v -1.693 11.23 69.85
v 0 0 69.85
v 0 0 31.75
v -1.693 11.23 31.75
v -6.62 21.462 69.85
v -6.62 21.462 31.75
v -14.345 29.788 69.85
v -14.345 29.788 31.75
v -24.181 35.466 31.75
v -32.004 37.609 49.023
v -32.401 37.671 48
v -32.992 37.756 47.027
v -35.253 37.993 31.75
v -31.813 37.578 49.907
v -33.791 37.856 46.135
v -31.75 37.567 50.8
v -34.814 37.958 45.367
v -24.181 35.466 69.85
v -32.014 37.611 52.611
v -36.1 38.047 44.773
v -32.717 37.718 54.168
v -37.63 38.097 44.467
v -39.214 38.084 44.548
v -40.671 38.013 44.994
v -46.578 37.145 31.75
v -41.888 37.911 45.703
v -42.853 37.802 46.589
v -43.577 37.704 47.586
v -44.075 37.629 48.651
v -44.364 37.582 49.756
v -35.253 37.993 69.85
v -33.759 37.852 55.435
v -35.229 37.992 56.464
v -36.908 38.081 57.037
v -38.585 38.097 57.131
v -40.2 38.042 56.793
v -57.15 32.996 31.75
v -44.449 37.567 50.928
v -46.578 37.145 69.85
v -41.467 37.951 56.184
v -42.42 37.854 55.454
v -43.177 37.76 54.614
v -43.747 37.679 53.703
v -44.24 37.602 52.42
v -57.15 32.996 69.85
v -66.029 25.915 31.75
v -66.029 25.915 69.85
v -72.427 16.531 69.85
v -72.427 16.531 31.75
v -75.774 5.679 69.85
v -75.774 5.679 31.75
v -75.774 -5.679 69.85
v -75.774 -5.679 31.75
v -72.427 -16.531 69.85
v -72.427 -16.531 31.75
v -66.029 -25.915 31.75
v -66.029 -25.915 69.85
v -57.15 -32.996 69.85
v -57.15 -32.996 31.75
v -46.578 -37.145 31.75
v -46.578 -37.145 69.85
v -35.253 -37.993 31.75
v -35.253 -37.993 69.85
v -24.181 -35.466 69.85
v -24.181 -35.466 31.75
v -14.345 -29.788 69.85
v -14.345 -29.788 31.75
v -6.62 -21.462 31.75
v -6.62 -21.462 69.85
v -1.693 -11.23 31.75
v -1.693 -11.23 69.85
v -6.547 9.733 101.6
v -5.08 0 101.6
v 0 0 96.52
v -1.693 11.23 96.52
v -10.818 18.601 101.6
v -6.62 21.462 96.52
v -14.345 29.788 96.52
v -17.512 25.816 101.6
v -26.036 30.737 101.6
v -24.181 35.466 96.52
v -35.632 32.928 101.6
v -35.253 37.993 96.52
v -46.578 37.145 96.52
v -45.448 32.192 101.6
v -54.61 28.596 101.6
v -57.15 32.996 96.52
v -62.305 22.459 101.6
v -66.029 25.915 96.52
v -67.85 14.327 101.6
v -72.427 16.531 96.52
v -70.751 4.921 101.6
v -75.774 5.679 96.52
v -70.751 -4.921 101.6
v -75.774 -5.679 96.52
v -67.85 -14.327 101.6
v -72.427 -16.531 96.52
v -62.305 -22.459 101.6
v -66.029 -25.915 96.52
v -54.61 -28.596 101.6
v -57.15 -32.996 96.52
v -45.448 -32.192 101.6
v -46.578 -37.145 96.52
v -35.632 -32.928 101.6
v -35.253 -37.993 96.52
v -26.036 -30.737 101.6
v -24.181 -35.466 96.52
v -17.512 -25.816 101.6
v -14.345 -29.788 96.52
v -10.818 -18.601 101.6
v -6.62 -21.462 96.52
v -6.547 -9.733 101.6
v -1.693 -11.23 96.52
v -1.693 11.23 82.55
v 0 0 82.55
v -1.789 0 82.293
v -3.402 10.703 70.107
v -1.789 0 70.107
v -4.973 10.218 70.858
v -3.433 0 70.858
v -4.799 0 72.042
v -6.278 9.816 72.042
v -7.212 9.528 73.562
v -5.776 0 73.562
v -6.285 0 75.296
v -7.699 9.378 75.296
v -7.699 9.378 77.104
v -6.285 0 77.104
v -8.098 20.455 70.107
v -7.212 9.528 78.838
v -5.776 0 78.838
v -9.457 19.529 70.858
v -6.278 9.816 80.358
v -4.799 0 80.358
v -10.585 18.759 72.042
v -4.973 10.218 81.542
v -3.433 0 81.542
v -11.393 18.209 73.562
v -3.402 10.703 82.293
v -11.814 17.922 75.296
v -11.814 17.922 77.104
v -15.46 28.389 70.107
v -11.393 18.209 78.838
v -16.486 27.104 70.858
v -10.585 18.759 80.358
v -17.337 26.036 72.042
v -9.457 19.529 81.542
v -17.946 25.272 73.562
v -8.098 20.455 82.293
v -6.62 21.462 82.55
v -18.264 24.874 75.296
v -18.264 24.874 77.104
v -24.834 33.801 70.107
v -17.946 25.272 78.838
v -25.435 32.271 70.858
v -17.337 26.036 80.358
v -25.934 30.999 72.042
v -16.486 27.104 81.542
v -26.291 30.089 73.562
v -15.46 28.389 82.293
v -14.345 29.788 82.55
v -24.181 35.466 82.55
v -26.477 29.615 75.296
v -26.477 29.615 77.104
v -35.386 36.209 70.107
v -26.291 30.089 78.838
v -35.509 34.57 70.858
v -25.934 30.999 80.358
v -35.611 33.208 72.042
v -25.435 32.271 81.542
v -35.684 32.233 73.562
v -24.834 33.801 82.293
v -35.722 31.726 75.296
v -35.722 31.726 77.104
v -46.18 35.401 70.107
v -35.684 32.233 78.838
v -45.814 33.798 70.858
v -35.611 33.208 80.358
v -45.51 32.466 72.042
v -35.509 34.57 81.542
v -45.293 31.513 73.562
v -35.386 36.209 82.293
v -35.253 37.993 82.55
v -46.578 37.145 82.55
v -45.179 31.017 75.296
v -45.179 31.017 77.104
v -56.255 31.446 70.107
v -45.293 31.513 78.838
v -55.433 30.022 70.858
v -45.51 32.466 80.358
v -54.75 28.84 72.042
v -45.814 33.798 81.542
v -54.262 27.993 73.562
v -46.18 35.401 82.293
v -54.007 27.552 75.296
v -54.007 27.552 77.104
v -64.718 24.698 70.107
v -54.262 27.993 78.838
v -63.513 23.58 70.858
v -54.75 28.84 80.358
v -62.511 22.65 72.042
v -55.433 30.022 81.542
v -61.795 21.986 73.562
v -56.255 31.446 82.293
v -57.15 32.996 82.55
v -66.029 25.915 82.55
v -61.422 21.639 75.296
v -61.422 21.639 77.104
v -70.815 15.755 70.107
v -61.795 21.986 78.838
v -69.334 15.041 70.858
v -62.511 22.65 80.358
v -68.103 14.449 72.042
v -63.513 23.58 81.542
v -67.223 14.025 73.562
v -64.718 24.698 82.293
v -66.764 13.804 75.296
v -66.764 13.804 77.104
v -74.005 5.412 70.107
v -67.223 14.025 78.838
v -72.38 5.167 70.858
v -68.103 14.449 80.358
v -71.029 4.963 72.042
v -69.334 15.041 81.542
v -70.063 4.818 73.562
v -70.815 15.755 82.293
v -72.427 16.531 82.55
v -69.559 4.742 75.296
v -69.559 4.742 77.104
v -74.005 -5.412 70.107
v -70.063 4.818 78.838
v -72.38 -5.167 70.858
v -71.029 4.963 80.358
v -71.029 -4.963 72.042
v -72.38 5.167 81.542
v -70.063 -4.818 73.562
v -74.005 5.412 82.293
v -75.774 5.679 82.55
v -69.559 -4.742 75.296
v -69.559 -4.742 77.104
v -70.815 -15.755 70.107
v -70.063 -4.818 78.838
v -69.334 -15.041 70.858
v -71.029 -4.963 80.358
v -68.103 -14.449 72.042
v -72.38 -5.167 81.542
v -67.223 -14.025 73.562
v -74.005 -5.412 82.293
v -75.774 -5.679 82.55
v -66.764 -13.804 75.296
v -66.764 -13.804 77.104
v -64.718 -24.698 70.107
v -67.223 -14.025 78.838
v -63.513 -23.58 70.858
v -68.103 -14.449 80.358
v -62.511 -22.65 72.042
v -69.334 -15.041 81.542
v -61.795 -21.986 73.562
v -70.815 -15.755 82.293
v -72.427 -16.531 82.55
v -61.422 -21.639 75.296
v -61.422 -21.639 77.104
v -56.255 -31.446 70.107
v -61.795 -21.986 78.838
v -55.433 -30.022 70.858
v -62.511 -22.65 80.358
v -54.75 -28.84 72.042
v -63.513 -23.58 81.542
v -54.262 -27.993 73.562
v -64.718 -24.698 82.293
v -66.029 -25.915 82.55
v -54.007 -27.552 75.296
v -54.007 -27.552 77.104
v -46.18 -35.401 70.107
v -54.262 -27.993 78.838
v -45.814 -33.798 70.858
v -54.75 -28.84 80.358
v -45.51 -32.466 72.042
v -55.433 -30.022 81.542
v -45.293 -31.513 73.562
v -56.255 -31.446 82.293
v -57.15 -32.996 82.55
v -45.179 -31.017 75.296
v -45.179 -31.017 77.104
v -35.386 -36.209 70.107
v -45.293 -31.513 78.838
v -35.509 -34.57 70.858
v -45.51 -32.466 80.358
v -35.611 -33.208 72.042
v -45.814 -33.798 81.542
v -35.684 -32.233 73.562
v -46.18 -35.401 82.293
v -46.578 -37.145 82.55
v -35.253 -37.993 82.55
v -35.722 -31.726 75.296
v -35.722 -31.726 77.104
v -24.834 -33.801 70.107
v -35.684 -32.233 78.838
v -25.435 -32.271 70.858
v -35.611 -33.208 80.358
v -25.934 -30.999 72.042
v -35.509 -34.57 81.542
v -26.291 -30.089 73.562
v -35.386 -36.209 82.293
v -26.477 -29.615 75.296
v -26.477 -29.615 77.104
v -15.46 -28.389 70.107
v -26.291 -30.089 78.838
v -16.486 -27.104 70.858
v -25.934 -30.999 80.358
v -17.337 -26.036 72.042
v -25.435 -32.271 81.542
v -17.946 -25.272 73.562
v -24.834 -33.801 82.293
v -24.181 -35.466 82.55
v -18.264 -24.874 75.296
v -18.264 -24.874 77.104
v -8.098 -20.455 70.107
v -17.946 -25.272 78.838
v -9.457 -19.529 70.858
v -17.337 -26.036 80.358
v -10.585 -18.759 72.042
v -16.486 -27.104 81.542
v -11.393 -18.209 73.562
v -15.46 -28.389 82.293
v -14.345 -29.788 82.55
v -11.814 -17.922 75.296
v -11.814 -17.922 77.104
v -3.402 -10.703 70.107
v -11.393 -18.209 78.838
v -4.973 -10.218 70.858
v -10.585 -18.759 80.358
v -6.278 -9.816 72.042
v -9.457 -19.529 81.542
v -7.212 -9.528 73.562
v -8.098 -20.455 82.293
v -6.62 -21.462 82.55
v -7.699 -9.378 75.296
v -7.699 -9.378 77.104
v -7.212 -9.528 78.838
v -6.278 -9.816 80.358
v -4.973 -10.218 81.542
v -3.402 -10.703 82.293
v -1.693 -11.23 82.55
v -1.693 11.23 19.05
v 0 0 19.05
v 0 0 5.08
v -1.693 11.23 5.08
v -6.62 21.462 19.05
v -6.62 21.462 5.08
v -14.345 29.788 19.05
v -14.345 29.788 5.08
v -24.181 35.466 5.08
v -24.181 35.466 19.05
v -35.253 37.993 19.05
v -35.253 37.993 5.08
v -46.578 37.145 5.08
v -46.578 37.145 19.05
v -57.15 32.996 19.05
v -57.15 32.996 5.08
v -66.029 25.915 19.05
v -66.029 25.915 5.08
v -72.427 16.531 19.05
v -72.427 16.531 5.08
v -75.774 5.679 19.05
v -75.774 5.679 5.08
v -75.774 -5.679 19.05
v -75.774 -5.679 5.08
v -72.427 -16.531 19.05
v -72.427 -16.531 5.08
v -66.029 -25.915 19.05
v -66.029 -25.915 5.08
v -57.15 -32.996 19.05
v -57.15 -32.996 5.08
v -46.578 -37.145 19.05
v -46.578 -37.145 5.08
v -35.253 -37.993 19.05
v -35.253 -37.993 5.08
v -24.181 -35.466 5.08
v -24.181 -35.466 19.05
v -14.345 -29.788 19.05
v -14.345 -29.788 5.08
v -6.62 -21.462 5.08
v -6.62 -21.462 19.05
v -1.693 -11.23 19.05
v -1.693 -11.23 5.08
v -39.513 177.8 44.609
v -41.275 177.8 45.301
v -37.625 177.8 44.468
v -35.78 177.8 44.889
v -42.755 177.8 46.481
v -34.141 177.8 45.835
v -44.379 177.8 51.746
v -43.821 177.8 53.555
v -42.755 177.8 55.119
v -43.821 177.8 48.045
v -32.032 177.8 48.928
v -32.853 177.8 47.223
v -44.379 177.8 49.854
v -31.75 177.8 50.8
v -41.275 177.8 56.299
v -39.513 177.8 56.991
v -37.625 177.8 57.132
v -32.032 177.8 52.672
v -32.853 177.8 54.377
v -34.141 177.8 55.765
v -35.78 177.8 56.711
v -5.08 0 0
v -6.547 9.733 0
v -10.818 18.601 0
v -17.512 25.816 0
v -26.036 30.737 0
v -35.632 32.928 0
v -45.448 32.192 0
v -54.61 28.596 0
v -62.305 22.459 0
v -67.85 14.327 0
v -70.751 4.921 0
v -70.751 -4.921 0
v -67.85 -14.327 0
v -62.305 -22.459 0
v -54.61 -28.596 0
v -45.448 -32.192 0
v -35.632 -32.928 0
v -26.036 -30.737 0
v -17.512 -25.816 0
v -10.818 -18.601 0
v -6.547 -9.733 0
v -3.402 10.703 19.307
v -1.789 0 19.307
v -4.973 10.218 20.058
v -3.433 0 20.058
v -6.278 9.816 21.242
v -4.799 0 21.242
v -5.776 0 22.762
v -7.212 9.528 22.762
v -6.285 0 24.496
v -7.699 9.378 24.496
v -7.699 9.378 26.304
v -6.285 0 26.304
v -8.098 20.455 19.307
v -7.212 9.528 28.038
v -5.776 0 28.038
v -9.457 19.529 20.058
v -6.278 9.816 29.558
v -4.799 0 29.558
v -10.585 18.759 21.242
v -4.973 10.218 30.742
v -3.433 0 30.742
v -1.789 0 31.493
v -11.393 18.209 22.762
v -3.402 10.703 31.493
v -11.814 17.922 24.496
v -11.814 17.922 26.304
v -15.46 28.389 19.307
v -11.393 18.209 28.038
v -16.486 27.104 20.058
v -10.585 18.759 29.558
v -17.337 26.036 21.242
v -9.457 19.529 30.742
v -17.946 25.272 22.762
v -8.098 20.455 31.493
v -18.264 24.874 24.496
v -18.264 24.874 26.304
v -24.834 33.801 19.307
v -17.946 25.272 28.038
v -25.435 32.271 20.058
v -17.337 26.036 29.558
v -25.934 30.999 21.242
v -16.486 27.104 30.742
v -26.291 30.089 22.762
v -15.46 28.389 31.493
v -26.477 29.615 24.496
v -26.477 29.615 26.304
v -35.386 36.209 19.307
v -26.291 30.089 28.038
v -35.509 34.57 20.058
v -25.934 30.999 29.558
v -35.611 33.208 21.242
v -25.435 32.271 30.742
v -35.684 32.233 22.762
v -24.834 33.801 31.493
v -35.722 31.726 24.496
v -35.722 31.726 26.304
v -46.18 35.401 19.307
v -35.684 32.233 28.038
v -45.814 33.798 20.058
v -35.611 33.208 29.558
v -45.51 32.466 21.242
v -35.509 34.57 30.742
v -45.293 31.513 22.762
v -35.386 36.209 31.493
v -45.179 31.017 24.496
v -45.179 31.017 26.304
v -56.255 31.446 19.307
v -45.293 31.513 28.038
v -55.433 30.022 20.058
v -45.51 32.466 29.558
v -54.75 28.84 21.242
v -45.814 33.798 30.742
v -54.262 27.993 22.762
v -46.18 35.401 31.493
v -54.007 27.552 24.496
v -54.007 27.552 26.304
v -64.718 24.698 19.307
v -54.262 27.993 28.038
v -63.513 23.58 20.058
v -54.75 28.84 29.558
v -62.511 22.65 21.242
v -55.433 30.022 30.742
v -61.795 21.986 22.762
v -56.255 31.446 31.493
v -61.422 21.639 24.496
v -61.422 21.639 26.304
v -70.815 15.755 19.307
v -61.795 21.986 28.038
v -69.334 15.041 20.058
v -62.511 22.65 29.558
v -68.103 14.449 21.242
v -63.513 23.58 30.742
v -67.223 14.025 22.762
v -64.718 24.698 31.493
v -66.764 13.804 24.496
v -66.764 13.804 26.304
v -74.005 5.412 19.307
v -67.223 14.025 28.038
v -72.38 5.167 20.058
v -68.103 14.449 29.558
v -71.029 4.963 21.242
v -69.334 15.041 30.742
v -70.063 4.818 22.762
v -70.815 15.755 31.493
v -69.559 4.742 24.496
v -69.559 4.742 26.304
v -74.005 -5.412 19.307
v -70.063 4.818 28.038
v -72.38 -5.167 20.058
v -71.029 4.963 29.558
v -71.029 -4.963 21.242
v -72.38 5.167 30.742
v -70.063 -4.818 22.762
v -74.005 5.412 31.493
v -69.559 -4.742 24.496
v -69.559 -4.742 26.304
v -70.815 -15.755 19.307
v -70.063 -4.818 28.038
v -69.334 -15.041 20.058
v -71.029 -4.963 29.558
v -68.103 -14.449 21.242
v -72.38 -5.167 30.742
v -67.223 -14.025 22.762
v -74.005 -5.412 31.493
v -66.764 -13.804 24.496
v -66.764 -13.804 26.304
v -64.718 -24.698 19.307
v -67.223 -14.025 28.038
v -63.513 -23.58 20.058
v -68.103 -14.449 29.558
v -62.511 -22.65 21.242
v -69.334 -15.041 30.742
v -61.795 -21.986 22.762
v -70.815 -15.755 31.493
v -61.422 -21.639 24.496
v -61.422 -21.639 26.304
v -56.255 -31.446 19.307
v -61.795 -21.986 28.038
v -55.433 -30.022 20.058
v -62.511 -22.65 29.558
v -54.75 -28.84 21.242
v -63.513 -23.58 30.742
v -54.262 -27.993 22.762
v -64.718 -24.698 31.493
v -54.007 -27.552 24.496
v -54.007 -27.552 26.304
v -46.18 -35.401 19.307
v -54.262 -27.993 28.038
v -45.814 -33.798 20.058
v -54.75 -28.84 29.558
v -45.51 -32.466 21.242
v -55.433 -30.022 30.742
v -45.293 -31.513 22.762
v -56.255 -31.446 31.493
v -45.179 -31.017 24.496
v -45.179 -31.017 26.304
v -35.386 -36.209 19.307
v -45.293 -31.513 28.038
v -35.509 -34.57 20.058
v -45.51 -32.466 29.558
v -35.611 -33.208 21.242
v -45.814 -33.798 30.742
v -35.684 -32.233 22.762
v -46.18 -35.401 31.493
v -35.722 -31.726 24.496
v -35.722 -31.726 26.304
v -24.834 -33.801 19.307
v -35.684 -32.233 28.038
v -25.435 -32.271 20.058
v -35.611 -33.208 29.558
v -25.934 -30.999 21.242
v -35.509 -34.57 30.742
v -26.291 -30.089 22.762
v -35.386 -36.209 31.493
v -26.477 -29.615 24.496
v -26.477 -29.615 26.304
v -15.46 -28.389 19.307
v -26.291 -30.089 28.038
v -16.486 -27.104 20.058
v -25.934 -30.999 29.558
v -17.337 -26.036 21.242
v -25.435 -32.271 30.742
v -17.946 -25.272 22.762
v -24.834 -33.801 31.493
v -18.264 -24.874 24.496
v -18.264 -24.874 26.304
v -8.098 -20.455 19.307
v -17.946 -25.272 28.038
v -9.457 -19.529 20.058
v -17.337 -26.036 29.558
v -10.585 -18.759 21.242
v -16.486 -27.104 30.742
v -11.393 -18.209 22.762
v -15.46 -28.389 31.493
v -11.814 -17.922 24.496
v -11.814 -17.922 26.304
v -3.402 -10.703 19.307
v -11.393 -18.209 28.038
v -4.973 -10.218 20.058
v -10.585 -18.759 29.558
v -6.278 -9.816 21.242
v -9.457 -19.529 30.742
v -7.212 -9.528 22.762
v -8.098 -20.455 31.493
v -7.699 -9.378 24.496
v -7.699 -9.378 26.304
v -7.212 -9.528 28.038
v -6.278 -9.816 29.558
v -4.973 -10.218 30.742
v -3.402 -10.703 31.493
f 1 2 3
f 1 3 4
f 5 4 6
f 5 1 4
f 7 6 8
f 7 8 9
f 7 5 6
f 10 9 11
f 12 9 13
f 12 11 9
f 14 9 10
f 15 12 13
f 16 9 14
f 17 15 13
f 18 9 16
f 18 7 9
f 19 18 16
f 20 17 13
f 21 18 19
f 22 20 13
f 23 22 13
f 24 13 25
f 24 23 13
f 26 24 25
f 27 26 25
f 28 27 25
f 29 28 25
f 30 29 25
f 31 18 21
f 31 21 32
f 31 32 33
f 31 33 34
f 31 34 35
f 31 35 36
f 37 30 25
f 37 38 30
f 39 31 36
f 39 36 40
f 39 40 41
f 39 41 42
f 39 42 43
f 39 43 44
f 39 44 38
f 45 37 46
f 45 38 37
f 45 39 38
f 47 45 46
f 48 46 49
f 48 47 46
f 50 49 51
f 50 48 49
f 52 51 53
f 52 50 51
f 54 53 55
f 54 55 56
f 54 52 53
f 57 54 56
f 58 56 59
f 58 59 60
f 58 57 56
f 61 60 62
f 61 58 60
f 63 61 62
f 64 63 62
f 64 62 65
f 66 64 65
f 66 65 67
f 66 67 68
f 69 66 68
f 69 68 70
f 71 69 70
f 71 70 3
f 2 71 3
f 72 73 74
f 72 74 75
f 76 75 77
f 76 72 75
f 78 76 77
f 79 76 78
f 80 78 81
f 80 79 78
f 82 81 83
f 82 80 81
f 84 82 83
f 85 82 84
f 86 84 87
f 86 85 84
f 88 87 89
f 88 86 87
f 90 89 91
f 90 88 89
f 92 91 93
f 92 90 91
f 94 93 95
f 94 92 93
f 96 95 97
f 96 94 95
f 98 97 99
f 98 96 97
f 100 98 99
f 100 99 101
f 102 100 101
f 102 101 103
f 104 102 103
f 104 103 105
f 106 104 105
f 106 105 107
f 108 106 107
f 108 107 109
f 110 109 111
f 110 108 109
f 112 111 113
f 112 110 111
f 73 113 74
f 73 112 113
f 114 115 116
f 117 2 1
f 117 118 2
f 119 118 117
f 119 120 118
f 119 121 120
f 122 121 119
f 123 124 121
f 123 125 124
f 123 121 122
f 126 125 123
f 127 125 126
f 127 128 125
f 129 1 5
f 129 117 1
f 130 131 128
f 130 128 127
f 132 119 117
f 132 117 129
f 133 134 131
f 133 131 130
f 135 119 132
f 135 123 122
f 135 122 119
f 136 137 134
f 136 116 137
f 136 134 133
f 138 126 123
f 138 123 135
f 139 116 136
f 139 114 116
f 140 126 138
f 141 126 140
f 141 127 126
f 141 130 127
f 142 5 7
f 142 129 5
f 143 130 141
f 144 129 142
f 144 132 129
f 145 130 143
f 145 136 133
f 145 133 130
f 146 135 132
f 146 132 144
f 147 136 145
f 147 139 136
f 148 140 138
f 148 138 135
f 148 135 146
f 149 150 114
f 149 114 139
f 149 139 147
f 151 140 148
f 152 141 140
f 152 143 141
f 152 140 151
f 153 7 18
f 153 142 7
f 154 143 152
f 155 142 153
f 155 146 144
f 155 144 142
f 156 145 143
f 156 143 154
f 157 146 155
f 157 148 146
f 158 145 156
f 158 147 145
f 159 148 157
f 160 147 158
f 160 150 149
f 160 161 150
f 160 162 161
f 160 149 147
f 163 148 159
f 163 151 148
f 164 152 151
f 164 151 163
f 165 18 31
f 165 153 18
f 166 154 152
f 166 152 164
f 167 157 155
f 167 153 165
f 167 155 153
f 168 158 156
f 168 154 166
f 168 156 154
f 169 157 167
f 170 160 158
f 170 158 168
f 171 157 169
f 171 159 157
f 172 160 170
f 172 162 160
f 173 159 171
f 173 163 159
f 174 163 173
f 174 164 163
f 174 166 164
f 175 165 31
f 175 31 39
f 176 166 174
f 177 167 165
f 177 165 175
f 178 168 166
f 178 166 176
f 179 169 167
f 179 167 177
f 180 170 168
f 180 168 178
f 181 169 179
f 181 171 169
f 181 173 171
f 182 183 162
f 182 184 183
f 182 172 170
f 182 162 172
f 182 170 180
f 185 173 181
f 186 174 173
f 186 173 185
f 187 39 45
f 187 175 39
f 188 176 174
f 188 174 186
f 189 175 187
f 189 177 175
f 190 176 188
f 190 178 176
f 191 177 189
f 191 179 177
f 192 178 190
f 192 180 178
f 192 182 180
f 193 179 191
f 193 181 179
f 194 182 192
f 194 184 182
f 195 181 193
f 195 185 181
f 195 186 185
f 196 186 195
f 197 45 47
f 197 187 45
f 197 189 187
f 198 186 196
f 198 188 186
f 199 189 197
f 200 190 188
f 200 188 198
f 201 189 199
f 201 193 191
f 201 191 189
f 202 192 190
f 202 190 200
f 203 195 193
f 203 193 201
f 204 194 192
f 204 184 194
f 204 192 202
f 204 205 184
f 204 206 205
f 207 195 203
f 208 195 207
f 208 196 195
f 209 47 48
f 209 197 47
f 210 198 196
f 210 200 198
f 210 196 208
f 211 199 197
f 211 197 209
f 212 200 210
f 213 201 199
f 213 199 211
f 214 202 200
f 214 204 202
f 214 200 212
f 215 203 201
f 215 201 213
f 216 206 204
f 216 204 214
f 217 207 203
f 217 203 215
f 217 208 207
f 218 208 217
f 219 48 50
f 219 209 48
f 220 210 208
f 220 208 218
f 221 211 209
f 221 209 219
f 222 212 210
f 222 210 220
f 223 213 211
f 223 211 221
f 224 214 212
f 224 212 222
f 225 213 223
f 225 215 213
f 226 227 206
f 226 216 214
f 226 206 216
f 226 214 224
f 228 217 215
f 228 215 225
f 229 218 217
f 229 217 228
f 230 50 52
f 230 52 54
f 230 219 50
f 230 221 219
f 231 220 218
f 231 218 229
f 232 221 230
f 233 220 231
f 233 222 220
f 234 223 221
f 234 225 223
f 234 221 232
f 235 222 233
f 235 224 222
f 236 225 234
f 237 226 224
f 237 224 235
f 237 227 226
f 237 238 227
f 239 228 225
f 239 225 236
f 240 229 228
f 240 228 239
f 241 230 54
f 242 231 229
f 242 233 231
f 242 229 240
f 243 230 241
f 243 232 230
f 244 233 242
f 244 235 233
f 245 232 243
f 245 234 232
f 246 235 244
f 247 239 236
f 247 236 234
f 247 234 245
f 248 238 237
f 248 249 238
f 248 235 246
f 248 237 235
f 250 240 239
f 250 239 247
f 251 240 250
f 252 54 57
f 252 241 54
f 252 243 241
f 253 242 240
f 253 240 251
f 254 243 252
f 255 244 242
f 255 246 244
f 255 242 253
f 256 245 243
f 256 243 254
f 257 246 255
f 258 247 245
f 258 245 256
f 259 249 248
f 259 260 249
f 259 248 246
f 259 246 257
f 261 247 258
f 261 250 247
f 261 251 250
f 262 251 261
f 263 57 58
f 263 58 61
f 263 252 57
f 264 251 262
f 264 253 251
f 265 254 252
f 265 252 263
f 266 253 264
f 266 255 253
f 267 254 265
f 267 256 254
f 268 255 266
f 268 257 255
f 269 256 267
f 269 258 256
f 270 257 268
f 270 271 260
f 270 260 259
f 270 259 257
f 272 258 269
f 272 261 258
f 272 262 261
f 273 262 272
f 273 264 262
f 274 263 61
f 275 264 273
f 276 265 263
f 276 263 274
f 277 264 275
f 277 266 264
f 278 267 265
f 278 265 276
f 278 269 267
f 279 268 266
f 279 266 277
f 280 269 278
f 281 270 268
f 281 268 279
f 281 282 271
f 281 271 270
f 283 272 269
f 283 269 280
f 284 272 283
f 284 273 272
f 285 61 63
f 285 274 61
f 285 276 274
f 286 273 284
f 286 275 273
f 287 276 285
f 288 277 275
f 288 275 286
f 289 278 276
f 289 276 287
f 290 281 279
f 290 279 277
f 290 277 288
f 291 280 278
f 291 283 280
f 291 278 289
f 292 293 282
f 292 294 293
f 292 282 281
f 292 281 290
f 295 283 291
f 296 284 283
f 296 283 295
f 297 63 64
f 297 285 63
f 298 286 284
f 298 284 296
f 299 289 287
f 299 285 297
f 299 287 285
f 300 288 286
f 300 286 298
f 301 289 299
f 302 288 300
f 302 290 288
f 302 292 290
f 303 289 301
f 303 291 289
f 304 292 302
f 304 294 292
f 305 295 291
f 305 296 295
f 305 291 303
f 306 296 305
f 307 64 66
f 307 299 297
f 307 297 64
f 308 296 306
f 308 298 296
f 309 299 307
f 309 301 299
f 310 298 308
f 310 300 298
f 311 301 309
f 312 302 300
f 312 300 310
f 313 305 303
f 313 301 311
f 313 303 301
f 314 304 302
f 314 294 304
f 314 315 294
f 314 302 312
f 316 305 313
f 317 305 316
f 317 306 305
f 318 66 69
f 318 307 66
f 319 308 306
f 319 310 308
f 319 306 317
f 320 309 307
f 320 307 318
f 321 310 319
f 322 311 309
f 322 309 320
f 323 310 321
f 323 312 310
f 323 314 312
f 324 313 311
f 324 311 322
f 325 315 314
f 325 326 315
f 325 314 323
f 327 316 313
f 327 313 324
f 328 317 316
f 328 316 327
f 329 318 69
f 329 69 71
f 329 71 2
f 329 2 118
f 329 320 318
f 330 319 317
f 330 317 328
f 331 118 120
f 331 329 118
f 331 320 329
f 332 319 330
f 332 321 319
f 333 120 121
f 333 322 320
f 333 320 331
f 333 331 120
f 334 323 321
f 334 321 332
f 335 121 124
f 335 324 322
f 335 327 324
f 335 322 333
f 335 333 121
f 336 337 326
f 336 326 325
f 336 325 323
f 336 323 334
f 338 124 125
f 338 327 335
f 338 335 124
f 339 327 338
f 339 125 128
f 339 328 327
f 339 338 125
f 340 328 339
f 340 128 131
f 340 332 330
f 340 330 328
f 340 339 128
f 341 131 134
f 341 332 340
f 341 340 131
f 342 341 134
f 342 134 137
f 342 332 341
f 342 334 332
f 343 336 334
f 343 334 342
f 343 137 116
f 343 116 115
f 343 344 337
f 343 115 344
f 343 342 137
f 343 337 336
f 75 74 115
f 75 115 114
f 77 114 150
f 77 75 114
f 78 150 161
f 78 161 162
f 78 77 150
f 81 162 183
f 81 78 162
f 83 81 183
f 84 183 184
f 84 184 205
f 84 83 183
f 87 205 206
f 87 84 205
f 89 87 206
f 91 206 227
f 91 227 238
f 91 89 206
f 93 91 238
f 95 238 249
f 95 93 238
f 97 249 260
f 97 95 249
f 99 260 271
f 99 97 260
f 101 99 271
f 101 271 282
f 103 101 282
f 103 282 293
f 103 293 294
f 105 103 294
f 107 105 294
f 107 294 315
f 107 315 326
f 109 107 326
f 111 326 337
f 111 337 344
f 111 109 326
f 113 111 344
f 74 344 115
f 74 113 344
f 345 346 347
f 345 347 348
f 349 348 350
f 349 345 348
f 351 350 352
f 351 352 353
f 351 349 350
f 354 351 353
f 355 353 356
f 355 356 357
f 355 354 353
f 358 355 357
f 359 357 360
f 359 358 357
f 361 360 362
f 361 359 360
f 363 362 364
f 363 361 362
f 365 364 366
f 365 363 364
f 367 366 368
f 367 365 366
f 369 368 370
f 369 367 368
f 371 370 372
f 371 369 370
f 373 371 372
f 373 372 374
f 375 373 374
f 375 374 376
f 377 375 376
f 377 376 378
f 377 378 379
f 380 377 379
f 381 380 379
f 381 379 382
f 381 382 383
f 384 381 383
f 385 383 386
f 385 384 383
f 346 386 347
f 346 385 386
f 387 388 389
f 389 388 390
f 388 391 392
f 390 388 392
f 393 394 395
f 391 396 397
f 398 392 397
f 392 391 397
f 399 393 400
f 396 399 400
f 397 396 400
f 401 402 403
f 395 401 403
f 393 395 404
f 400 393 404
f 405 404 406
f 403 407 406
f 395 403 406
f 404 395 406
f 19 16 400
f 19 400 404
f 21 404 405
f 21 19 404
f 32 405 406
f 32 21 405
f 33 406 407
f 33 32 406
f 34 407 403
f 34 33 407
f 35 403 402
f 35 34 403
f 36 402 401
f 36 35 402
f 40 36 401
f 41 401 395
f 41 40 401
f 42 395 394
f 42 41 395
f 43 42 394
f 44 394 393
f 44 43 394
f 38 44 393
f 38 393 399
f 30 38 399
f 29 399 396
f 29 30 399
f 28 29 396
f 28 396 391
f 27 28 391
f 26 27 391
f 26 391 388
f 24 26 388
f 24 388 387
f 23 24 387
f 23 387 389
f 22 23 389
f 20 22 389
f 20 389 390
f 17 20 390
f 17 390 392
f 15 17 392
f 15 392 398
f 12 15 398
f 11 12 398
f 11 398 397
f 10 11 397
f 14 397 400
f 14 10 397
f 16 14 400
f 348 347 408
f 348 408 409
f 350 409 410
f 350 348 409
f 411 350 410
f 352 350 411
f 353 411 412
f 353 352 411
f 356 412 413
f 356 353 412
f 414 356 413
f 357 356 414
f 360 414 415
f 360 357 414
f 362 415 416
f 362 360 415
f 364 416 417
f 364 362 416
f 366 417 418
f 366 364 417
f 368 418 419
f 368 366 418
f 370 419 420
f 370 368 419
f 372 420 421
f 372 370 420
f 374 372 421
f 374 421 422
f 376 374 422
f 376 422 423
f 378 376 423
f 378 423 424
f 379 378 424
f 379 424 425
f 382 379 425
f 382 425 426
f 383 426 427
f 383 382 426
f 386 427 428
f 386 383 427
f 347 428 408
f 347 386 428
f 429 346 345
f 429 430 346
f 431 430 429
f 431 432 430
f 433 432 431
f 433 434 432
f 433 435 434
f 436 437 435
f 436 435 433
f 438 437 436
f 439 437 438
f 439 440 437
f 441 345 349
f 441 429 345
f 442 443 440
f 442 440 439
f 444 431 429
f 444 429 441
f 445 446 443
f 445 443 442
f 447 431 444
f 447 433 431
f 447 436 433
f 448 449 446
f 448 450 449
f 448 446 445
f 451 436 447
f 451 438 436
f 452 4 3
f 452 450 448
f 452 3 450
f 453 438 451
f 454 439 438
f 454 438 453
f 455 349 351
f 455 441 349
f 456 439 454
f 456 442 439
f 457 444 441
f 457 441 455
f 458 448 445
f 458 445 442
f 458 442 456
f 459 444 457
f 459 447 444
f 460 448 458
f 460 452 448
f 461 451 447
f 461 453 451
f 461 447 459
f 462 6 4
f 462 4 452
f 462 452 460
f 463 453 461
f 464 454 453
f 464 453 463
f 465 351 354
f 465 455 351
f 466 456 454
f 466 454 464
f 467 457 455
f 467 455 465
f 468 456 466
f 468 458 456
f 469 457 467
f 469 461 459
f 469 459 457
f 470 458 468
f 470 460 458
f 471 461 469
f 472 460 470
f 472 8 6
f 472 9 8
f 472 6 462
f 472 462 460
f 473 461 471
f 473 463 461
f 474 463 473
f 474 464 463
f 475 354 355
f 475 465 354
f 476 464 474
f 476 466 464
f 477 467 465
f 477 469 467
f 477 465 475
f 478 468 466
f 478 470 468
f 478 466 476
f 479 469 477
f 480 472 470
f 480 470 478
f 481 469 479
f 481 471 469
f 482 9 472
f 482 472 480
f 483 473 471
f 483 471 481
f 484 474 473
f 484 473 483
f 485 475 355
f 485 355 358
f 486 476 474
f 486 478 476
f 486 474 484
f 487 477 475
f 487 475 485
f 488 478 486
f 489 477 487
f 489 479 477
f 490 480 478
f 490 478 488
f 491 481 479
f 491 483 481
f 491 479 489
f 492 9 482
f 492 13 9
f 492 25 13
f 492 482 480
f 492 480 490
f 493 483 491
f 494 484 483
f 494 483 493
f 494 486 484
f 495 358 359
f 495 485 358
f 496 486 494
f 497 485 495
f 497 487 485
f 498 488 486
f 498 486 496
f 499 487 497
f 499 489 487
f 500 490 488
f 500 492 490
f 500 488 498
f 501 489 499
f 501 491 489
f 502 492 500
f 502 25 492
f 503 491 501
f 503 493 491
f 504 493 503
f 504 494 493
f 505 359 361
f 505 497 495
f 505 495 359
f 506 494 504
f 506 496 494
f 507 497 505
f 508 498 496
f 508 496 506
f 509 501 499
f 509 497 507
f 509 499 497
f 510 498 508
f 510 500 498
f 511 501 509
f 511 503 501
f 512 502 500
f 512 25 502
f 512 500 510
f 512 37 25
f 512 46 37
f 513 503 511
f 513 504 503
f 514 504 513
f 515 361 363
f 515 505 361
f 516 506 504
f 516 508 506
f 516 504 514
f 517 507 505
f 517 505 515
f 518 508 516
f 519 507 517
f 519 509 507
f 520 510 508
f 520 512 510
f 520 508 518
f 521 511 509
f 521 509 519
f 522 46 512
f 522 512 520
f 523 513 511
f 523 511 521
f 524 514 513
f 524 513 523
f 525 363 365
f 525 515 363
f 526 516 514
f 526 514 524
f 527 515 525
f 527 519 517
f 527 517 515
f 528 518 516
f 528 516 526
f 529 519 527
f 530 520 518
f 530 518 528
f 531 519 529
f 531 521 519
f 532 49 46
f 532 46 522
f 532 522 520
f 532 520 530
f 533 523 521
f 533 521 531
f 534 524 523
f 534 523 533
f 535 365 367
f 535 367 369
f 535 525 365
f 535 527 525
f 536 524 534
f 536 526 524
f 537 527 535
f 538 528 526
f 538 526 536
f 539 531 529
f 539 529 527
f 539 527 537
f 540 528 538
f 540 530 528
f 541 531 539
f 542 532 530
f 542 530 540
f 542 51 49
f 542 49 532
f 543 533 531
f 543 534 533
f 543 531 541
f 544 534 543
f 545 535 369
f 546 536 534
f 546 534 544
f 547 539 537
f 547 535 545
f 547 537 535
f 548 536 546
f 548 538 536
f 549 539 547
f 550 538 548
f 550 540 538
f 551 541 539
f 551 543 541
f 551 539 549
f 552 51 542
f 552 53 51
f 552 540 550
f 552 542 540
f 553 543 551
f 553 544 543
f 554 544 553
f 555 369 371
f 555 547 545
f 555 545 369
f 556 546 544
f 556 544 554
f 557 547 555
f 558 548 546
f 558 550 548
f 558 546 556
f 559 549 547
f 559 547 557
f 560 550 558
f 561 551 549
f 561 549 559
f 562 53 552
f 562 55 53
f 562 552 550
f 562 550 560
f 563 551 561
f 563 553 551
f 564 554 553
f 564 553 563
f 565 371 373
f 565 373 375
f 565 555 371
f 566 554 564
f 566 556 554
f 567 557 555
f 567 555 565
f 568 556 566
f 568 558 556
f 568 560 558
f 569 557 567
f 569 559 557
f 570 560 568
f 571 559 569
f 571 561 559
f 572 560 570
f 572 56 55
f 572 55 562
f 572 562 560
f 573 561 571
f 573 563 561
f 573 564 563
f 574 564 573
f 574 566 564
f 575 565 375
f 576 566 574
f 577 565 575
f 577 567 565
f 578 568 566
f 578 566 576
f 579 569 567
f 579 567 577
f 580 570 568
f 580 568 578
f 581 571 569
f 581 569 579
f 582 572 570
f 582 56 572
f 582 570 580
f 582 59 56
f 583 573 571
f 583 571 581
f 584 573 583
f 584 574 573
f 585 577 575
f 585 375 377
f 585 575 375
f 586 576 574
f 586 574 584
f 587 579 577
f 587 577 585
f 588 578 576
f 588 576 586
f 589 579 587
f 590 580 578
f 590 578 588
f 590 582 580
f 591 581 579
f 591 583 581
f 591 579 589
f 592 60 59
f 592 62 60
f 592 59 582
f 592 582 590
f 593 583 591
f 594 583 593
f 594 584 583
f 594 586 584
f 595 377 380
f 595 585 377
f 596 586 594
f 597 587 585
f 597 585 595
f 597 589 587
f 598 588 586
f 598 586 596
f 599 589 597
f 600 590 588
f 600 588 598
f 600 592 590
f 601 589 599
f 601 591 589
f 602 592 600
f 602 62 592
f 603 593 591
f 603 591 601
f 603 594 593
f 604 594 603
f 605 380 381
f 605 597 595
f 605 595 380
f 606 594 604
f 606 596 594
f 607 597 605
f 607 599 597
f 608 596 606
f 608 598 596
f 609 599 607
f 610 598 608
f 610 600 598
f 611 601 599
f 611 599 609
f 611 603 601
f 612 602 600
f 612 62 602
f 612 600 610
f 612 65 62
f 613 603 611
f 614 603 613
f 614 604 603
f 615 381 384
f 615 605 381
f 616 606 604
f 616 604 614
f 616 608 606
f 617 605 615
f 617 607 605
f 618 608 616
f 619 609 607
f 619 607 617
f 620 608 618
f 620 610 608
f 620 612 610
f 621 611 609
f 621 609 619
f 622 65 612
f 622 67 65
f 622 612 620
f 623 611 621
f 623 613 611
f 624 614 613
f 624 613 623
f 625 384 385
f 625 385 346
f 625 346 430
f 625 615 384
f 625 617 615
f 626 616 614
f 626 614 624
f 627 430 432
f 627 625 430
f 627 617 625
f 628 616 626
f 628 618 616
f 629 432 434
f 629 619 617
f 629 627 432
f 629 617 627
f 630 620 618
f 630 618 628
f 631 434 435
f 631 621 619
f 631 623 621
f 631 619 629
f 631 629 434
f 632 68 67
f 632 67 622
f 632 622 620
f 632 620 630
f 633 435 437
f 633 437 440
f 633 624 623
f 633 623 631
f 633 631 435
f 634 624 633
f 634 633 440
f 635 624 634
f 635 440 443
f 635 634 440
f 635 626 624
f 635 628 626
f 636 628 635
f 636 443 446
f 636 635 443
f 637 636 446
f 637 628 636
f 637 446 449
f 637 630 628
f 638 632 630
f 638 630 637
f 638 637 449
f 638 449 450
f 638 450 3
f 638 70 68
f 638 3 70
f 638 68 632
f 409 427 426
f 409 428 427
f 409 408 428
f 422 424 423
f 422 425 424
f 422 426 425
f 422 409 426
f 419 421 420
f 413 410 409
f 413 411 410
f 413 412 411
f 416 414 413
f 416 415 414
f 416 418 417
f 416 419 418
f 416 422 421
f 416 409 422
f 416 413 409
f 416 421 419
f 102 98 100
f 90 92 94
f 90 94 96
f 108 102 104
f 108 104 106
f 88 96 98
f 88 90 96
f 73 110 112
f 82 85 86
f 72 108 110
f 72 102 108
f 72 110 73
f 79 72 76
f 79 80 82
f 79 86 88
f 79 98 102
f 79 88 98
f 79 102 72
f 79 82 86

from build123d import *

# Parameters (mm, degrees)
F2_SIZE  = 5.08
F3_R     = 6.35
F4_DEPTH = 127
F5_DEPTH = 177.8


with BuildPart() as f1:
    # F0 (on Front) → F1 (revolve)
    with BuildSketch(Plane.XZ):
        with BuildLine():
            Line((-38.1, 0), (0, 0))
            Line((0, 0), (0, 19.05))
            ThreePointArc((0, 19.05), (-6.35, 25.4), (0, 31.75))
            Line((0, 31.75), (0, 69.85))
            ThreePointArc((0, 69.85), (-6.35, 76.2), (0, 82.55))
            Line((0, 82.55), (0, 101.6))
            Line((0, 101.6), (-38.1, 101.6))
            Line((-38.1, 101.6), (-38.1, 0))
        make_face()
    revolve(axis=Axis((-38.1, 0, 50.8), (0, 0, 1)))

    # F2
    f2_edges = [f1.edges().sort_by_distance(p)[0] for p in [
        (-76.2, 0, 101.6),
        (-76.2, 0, 0),
    ]]
    chamfer(f2_edges, length=F2_SIZE)

    # F3 (on Front) → F4 (cut)
    with BuildSketch(Plane.XZ):
        with Locations((-38.1, 50.8)):
            Circle(F3_R)
    extrude(amount=-F4_DEPTH, mode=Mode.SUBTRACT)

    # F5 (add): a face of the model
    f5_faces = [f1.faces().sort_by_distance(p)[0] for p in [
        (-38.1, 0, 50.8),
    ]]
    extrude(f5_faces, amount=F5_DEPTH)


solid = f1.part
